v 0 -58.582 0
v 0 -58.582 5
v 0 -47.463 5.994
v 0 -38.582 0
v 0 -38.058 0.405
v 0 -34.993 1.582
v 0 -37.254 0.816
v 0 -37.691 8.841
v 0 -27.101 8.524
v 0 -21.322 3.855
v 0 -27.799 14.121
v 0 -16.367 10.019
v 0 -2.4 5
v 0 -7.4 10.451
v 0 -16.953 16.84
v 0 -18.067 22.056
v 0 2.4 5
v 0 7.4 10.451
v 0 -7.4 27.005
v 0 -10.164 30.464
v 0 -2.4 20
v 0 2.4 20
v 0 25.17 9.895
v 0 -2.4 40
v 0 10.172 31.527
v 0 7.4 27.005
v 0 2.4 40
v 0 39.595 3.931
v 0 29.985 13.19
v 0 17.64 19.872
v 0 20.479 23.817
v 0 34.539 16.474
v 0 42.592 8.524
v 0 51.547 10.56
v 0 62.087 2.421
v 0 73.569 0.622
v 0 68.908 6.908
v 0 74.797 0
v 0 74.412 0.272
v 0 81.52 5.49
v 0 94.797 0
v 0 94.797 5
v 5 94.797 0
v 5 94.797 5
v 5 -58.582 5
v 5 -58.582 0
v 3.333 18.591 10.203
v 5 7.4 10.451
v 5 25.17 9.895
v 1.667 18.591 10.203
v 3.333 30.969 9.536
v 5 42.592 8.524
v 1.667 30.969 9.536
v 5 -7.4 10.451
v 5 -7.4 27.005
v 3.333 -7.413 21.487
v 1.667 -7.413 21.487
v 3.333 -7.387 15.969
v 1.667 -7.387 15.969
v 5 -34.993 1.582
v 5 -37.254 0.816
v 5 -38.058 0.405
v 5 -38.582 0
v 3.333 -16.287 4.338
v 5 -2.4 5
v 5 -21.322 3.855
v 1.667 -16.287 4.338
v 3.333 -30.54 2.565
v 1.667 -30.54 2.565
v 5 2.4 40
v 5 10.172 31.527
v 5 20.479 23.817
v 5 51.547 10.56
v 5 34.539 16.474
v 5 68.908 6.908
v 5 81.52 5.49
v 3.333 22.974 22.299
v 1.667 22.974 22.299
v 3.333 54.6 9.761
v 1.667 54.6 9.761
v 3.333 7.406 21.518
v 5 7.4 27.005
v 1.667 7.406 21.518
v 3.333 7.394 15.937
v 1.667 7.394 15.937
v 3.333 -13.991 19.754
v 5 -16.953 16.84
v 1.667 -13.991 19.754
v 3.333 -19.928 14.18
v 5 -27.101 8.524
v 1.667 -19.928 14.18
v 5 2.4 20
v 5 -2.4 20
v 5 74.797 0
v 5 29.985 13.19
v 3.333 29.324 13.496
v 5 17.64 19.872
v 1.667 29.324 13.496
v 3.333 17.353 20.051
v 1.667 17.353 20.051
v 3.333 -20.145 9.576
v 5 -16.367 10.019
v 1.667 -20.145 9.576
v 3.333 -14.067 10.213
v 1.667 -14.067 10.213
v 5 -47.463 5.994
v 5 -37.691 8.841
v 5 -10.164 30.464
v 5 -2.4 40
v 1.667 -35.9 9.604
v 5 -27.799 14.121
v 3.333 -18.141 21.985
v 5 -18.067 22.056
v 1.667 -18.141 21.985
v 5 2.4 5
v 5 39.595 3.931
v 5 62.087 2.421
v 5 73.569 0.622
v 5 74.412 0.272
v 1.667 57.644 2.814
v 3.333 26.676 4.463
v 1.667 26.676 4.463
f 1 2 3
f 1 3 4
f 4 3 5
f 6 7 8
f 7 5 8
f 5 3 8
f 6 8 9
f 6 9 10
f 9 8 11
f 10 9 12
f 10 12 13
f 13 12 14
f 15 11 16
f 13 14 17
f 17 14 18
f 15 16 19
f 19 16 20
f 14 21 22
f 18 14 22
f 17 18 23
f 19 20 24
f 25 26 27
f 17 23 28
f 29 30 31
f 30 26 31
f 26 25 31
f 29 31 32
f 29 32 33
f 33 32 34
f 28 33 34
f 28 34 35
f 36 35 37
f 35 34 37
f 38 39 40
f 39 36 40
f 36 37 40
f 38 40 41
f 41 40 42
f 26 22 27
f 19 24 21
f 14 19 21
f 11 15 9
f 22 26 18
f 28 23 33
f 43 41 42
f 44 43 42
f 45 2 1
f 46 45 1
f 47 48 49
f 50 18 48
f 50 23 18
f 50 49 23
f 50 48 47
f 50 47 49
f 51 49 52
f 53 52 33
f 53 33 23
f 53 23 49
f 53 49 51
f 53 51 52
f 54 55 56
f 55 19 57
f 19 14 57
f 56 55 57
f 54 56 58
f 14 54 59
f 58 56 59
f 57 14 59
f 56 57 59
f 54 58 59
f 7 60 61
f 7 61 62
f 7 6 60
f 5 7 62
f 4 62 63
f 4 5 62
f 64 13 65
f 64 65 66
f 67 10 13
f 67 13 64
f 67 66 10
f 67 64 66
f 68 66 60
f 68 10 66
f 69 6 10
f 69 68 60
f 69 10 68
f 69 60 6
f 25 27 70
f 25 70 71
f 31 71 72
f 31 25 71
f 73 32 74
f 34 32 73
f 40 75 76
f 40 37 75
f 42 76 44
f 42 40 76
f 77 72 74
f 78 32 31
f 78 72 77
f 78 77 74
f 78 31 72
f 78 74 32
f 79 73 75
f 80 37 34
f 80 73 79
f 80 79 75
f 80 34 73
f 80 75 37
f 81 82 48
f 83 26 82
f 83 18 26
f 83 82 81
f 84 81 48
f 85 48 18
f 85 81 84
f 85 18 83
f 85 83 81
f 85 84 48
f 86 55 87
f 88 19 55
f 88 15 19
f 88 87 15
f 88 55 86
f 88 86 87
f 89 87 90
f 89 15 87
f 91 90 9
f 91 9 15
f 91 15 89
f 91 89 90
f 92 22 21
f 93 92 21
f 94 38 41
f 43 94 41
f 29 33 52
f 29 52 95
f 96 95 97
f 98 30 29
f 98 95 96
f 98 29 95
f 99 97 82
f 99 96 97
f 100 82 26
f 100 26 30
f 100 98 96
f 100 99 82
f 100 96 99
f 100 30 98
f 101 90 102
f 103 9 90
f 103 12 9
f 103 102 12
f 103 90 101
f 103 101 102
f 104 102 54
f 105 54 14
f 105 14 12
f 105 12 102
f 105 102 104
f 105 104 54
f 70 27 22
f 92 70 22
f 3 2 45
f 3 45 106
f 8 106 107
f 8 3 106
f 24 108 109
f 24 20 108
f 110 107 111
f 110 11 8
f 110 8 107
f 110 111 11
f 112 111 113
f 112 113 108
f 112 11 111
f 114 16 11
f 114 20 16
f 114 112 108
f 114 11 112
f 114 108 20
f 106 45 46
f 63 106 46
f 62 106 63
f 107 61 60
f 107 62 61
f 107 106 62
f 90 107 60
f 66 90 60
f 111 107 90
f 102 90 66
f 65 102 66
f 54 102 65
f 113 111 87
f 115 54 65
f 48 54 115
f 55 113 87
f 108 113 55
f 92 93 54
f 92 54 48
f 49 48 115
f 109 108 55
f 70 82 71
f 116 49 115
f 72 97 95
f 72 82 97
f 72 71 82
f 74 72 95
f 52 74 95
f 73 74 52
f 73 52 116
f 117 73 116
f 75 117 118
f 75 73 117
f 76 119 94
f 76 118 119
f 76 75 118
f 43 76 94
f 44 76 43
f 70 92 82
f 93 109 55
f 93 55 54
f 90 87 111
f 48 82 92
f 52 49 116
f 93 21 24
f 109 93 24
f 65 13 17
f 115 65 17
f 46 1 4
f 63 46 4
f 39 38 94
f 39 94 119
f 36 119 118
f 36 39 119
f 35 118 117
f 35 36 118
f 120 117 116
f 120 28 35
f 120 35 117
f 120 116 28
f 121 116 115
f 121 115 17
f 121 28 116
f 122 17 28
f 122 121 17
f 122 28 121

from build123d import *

# Parameters (mm, degrees)
F0_W     = 2.4
F0_H     = 15
F1_DEPTH = 5


# Not quite as in the source:
# - a feature names something its author has since deleted; it is built from what else it names


with BuildPart() as f1:
    # F0 (on Right) → F1 (new body)
    with BuildSketch(Plane.YZ):
        with Locations((-1.2, 12.5)):
            Rectangle(F0_W, F0_H)
        with Locations((1.2, 12.5)):
            Rectangle(F0_W, F0_H)
        with BuildLine():
            Line((2.4, 20), (2.4, 5))
            add(Edge.make_bspline(
                [(74.7971267972, 0), (71.3879865607, 3.4156564958), (16.494217181, 5), (2.4, 5)],
                knots=[0, 0, 0, 0, 72.5695801868, 72.5695801868, 72.5695801868, 72.5695801868], degree=3))
            Line((74.7971267972, 0), (94.7971267972, 0))
            Line((94.7971267972, 0), (94.7971267972, 5))
            add(Edge.make_bspline(
                [(2.4, 40), (16.6215170175, 20.5895993859), (51.1409416795, 5), (94.7971267972, 5)],
                knots=[0, 0, 0, 0, 98.8039930387, 98.8039930387, 98.8039930387, 98.8039930387], degree=3))
            Line((2.4, 40), (2.4, 20))
        make_face()
        with BuildLine():
            add(Edge.make_bspline(
                [(7.4, 27.0048175007), (7.4282917172, 21.6293986887), (7.3717082828, 15.8260287717), (7.4, 10.4506099597)],
                knots=[0, 0, 0, 0, 16.554207541, 16.554207541, 16.554207541, 16.554207541], degree=3))
            add(Edge.make_bspline(
                [(42.5923541188, 8.5242791101), (28.9157964289, 12.3093035072), (16.1028206348, 20.2473960817), (7.4, 27.0048175007)],
                knots=[0, 0, 0, 0, 39.7496174526, 39.7496174526, 39.7496174526, 39.7496174526], degree=3))
            add(Edge.make_bspline(
                [(7.4, 10.4506099597), (17.3497335032, 10.4361297563), (31.9942831993, 9.6850190312), (42.5923541188, 8.5242791101)],
                knots=[0, 0, 0, 0, 35.2450356641, 35.2450356641, 35.2450356641, 35.2450356641], degree=3))
        make_face(mode=Mode.SUBTRACT)
        with BuildLine():
            add(Edge.make_bspline(
                [(-2.4, 5), (-13.9117193222, 5), (-35.8368966605, 2.8542873915), (-38.5822232689, 0)],
                knots=[0, 0, 0, 0, 36.5260630329, 36.5260630329, 36.5260630329, 36.5260630329], degree=3))
            Line((-2.4, 5), (-2.4, 20))
            Line((-2.4, 20), (-2.4, 30.4898899049))
            Line((-2.4, 30.4898899049), (-2.4, 40))
            add(Edge.make_bspline(
                [(-58.5822232689, 5), (-32.4707888067, 5), (-18.0997792631, 19.8830608279), (-2.4, 40)],
                knots=[0, 0, 0, 0, 66.1924634036, 66.1924634036, 66.1924634036, 66.1924634036], degree=3))
            Line((-58.5822232689, 5), (-58.5822232689, 0))
            Line((-58.5822232689, 0), (-38.5822232689, 0))
        make_face()
        with BuildLine():
            add(Edge.make_bspline(
                [(-7.4, 27.0048175007), (-14.9471499026, 18.3299258351), (-18.6816509813, 14.8076107726), (-27.100559324, 8.5242791101)],
                knots=[0, 0, 0, 0, 27.0118925084, 27.0118925084, 27.0118925084, 27.0118925084], degree=3))
            add(Edge.make_bspline(
                [(-7.4, 27.0048175007), (-7.4600156685, 21.4867483204), (-7.3399843315, 15.96867914), (-7.4, 10.4506099597)],
                knots=[0, 0, 0, 0, 16.554207541, 16.554207541, 16.554207541, 16.554207541], degree=3))
            add(Edge.make_bspline(
                [(-27.100559324, 8.5242791101), (-19.2162878811, 9.7881155089), (-14.8515102789, 10.4084629565), (-7.4, 10.4506099597)],
                knots=[0, 0, 0, 0, 19.7945140941, 19.7945140941, 19.7945140941, 19.7945140941], degree=3))
        make_face(mode=Mode.SUBTRACT)
    extrude(amount=F1_DEPTH)


solid = f1.part
